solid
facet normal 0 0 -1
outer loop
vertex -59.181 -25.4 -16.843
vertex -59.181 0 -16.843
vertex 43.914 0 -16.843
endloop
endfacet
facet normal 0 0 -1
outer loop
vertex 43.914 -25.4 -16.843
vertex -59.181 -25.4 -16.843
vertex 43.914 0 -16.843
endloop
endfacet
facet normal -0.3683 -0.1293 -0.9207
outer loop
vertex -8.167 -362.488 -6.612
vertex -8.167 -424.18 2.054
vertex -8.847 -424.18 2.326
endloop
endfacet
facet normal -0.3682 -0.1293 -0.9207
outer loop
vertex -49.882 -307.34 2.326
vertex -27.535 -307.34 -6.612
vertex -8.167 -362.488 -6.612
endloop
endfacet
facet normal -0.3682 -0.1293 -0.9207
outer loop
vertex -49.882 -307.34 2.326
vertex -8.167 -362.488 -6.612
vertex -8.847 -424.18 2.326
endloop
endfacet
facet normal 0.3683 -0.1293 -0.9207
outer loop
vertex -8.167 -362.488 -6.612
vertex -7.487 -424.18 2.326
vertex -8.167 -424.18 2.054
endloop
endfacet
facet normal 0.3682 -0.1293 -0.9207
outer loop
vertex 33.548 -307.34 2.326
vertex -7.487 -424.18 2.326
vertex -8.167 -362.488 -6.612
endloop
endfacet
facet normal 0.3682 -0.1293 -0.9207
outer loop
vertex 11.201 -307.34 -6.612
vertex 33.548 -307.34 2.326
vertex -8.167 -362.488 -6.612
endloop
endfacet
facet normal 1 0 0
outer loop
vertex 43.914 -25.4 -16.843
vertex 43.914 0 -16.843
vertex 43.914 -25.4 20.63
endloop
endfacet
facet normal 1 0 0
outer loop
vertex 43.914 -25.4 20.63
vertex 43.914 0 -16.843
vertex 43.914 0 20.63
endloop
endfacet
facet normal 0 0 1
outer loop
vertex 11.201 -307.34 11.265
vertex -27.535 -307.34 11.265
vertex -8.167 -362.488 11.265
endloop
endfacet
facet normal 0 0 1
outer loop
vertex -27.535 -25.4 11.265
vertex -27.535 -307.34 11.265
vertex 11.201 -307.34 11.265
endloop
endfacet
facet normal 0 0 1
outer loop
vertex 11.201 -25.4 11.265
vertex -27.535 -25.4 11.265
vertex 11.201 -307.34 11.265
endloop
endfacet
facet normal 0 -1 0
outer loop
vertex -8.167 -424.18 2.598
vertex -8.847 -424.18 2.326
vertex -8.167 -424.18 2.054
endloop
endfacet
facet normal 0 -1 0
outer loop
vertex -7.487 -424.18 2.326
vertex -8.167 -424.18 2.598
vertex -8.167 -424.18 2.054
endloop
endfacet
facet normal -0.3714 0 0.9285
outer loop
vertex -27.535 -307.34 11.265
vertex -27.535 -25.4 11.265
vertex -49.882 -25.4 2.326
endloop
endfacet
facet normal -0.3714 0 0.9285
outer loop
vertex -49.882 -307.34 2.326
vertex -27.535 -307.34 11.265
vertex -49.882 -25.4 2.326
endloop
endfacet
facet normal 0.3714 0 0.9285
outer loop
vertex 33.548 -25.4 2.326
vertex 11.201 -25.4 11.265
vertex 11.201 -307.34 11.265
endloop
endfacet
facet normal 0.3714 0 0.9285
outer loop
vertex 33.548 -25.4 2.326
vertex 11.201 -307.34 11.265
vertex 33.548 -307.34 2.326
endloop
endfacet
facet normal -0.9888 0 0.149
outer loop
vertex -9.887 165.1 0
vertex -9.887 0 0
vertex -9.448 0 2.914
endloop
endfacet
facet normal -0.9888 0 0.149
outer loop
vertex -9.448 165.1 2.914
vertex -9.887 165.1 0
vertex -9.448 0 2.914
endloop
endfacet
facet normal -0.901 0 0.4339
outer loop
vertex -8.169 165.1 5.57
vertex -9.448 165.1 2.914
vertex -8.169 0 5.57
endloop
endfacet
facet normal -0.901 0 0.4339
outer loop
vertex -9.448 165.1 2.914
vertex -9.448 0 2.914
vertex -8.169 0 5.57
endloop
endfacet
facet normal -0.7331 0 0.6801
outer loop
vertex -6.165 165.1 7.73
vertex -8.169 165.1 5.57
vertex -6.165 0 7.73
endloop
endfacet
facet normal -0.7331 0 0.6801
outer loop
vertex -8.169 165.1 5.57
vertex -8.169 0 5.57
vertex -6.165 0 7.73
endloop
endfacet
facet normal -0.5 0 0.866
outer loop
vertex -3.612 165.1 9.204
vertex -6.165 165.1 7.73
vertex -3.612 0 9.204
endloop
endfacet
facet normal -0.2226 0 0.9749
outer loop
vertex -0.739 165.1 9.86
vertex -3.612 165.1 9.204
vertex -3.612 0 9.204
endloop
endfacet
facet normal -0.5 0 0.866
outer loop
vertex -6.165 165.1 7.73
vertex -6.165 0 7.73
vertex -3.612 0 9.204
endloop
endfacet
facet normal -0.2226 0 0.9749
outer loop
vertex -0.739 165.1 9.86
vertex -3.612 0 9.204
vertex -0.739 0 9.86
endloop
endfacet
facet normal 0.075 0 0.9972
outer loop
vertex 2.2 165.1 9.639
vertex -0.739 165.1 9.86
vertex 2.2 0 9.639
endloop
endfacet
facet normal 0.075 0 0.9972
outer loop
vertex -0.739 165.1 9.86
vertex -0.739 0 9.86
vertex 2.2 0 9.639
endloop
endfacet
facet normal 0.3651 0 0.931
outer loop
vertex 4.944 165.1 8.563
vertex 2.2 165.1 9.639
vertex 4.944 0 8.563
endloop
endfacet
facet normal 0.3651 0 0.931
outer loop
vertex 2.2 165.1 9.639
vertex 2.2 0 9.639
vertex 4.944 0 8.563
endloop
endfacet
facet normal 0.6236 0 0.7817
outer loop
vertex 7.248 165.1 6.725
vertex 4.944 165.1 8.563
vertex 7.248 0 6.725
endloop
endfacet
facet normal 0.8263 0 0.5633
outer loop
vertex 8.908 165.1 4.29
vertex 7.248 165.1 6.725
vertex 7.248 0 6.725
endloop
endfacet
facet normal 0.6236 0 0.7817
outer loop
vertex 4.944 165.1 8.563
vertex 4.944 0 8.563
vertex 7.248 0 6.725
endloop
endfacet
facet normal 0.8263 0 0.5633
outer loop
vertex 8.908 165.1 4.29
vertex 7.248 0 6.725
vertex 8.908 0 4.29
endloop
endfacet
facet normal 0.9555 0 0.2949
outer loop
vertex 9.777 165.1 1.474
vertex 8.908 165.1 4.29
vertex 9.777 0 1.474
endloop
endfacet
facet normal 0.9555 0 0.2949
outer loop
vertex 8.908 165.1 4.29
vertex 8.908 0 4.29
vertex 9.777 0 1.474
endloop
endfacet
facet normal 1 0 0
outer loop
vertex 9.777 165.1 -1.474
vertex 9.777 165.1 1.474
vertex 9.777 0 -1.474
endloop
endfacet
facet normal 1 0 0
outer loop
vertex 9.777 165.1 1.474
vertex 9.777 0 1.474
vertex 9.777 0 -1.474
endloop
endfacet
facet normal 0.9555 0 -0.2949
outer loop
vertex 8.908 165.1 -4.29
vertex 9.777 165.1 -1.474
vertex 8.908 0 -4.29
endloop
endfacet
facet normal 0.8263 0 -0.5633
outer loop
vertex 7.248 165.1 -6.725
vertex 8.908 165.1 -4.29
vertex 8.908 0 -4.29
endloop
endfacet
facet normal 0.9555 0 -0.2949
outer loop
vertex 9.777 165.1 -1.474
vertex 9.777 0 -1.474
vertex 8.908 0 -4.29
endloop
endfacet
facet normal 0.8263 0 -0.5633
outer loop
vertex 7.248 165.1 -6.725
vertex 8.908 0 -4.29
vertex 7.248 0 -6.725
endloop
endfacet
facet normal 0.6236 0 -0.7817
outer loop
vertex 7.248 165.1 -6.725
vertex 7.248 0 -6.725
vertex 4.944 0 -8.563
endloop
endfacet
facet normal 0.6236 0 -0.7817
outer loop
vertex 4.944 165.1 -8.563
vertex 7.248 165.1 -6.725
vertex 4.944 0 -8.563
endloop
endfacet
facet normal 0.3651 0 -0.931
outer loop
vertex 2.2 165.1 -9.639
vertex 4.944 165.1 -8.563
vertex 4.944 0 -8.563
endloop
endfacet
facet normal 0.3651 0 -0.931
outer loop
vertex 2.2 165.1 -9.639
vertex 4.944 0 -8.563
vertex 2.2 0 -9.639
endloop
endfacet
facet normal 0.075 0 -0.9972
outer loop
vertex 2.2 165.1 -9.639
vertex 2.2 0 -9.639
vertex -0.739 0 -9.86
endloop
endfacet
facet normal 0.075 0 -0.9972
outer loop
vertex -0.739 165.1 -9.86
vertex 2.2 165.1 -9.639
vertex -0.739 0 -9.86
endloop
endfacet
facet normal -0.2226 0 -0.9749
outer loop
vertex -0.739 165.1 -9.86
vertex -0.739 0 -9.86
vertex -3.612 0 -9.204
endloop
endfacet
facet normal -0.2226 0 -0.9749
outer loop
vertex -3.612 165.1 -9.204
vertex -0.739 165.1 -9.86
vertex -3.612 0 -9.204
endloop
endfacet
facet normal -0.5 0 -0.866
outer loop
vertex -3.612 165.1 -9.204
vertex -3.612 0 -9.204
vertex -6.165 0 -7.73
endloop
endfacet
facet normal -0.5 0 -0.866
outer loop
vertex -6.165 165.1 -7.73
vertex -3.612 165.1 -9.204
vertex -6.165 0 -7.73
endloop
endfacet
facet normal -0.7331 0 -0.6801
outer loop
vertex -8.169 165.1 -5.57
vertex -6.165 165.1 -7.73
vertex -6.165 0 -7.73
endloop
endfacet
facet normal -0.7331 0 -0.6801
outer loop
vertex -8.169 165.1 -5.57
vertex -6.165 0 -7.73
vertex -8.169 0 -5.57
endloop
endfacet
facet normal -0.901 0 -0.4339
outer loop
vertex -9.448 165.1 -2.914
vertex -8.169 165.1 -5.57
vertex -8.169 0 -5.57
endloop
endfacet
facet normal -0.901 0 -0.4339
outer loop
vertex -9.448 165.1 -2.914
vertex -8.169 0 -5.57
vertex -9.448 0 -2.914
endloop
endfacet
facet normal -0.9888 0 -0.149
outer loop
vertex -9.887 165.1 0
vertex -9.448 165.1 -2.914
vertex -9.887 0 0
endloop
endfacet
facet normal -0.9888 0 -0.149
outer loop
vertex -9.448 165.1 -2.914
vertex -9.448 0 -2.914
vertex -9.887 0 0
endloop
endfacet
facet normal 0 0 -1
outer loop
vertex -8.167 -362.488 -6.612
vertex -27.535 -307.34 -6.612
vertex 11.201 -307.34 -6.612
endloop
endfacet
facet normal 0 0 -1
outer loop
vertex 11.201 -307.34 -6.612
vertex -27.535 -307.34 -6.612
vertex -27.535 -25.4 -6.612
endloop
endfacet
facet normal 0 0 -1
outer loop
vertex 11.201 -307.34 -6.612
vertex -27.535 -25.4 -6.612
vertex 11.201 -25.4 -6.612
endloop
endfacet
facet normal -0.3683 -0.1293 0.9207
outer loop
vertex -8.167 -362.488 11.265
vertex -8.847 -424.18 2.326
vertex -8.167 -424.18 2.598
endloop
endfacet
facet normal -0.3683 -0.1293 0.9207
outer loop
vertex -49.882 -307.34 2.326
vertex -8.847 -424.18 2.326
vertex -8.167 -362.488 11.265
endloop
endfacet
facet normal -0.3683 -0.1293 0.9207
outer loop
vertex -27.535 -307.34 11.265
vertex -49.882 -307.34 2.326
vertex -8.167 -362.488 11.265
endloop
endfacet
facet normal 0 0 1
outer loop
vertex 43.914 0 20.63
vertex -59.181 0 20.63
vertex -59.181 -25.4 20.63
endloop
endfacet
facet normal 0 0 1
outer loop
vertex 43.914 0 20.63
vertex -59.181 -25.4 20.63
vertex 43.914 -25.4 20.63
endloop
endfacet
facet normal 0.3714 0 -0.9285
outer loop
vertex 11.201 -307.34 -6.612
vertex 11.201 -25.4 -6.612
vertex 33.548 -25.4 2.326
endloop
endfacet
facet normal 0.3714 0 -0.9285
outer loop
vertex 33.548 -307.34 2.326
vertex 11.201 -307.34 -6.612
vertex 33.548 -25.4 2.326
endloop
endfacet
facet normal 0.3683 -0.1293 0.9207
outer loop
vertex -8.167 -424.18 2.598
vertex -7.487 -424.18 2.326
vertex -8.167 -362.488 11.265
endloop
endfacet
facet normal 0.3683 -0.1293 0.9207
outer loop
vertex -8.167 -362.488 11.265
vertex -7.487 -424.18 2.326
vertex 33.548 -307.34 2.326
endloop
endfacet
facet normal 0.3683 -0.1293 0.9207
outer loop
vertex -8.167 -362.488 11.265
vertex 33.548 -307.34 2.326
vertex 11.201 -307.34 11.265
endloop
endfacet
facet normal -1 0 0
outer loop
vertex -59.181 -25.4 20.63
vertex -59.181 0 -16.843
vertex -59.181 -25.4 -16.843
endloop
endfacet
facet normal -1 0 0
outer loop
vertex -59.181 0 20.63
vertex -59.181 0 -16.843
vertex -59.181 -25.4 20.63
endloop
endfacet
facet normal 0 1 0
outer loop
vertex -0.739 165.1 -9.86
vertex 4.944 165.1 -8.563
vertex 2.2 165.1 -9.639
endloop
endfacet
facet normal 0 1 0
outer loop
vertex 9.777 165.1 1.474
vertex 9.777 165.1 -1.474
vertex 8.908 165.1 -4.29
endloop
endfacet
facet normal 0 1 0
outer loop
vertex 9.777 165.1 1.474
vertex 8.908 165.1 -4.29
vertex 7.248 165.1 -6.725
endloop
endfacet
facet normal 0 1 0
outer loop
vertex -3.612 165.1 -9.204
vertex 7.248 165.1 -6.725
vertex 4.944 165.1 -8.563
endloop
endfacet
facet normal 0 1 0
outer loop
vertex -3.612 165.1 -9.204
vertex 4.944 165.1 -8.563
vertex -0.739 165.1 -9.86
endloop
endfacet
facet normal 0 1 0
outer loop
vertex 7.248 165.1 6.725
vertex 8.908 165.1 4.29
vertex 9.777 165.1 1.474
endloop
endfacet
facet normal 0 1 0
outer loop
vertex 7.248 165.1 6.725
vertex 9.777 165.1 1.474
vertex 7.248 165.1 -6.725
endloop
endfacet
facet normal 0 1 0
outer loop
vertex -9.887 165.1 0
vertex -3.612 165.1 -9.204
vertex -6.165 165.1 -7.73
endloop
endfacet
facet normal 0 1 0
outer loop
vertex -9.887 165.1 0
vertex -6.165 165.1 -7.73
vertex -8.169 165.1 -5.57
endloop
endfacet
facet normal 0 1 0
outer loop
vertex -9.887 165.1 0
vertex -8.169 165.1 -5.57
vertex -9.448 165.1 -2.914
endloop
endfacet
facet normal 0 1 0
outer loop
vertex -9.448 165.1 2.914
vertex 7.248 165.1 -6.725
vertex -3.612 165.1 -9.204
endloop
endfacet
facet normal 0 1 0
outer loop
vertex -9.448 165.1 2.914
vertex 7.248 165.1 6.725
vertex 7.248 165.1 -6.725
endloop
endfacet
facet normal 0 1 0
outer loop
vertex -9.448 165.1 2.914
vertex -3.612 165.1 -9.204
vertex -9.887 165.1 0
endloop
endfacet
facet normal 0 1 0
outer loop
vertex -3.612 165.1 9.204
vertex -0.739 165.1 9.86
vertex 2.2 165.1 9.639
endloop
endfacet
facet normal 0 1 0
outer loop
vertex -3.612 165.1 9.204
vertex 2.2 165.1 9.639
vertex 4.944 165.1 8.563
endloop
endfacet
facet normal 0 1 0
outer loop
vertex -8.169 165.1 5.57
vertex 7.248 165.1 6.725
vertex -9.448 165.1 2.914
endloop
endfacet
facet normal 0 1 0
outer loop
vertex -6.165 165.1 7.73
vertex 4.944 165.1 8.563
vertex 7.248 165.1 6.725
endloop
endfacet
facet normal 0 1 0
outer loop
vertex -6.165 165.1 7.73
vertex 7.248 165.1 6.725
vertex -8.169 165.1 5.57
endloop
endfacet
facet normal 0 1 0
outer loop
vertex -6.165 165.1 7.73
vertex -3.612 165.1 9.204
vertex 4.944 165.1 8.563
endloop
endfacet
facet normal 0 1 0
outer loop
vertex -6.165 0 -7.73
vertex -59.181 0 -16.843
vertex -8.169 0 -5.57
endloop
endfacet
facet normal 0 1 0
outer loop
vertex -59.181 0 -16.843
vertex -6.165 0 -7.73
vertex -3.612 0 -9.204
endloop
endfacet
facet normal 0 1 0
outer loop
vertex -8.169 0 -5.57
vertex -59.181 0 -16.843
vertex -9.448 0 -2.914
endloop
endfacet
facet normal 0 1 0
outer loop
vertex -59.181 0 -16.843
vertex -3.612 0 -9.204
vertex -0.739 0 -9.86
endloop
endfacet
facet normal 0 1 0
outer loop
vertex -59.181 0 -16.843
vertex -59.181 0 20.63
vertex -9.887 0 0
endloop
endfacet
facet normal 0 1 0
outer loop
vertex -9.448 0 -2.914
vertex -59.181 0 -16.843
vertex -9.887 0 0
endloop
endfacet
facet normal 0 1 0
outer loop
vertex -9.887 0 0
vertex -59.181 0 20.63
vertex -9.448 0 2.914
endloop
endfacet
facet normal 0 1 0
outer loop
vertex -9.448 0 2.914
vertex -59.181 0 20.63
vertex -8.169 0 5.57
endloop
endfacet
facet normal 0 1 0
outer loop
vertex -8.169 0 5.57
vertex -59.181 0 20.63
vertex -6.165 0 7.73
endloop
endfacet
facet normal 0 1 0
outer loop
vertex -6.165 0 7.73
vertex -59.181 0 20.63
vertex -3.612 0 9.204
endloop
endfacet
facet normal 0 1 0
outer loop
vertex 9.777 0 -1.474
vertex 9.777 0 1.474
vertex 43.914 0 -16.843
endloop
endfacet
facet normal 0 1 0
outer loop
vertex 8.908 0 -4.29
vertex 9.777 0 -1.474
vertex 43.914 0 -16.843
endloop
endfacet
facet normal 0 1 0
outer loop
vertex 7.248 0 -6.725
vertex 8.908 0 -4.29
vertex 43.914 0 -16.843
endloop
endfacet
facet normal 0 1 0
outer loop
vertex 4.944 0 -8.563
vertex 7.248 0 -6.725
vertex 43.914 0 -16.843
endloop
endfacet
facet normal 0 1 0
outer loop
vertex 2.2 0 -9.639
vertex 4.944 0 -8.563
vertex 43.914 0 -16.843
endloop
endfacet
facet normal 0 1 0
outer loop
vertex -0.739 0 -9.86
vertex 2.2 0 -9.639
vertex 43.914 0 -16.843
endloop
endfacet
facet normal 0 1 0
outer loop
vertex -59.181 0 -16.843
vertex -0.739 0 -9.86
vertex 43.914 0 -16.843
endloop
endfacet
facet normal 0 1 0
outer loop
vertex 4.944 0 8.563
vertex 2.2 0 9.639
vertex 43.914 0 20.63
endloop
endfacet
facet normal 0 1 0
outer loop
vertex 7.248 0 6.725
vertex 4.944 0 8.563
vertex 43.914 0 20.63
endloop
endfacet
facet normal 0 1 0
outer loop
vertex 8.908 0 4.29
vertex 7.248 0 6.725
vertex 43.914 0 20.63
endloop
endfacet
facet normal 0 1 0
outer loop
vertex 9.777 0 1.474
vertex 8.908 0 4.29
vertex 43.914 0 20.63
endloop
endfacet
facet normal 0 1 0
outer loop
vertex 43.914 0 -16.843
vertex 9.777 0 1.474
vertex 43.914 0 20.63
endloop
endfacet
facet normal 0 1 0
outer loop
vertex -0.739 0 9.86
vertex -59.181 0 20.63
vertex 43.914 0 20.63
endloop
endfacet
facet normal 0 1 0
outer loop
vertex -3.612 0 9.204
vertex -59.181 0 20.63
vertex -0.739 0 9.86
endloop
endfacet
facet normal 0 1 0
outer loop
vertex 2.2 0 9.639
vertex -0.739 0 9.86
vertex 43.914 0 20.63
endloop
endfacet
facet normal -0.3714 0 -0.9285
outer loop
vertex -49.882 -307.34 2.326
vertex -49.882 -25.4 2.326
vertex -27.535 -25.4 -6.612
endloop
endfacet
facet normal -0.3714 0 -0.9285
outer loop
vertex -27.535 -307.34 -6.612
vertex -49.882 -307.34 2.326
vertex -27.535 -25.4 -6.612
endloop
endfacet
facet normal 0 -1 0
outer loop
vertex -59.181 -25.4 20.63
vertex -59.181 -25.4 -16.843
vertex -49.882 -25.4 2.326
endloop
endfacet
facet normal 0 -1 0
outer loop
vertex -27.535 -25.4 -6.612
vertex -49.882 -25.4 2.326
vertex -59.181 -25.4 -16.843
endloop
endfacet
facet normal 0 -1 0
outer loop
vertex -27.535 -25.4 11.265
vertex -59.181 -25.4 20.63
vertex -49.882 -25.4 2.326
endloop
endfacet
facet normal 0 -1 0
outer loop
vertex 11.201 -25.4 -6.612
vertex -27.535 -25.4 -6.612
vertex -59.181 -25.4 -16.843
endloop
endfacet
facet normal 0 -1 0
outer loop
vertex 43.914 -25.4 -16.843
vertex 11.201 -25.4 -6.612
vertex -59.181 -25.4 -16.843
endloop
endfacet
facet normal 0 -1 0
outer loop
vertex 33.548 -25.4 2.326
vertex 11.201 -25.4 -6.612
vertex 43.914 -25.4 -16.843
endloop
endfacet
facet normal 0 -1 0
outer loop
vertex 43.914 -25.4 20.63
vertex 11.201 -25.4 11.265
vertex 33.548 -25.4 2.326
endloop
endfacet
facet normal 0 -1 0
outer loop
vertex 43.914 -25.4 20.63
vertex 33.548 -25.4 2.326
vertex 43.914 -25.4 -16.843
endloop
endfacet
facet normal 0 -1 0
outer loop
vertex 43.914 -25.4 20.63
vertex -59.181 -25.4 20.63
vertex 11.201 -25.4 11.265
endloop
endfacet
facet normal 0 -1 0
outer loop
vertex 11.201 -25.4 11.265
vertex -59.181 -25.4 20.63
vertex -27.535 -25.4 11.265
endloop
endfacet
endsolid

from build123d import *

# Parameters (mm, degrees)
F0_W        = 103.0951477587
F0_H        = 37.4727938324
F1_DEPTH    = 25.4
F2_R        = 9.8872931358
F3_DEPTH    = 165.1
F4_W        = 89.5363204181
F4_H        = 17.8772863001
F5_DEPTH    = 398.78
F6_T1_DEPTH = 464.6450864339
F7_SIZE2    = 116.84
F7_SIZE     = 15.24


# Not quite as in the source:
# - a fillet or chamfer that OpenCascade refuses, or shapes differently, is made with other operations: its cross-section is extruded or revolved along the edge and cut away or added


with BuildPart() as f1:
    # F0 (on Front) → F1 (new body)
    with BuildSketch(Plane.XZ):
        with Locations((-7.6333563775, 1.8935641274)):
            Rectangle(F0_W, F0_H)
    extrude(amount=F1_DEPTH)

    # F2 (on face) → F3 (join)
    with BuildSketch(Plane(origin=(0, 0, 0), x_dir=(-1, 0, 0), z_dir=(0, 1, 0))):
        Circle(F2_R)
    extrude(amount=F3_DEPTH)

    # F4 (on face) → F5 (join)
    with BuildSketch(Plane.XZ.offset(25.4)):
        with Locations((-8.1669483334, 2.3263469338)):
            Rectangle(F4_W, F4_H)
    extrude(amount=F5_DEPTH)

    # F6: chamfer of 25.4 x 10.16 on 4 edges, made by hand

    # F6_s2 → F6_t1 (cut)
    with BuildSketch(Plane.XZ.offset(25.4)):
        Polygon((-52.9351085424, 3.5477037838), (-27.5351085424, -6.6122962162), (-52.9351085424, -6.6122962162), align=None)
        Polygon((-27.5351085424, 11.2649900839), (-52.9351085424, 1.1049900839), (-52.9351085424, 11.2649900839), align=None)
        Polygon((11.2012118757, -6.6122962162), (36.6012118757, 3.5477037838), (36.6012118757, -6.6122962162), align=None)
        Polygon((11.2012118757, 11.2649900839), (36.6012118757, 1.1049900839), (36.6012118757, 11.2649900839), align=None)
    extrude(amount=F6_T1_DEPTH, mode=Mode.SUBTRACT)

    # F7 (call 1 of 2: OpenCascade refuses the feature's edges together)
    f7_edges = [f1.edges().sort_by_distance(p)[0] for p in [
        (-38.708412, -424.18, -2.142975),
        (-38.708412, -424.18, 6.795669),
    ]]
    f7_side = f1.faces().sort_by_distance((-8.166948, -424.18, 2.326347))[0]
    chamfer(f7_edges, length=F7_SIZE, length2=F7_SIZE2, reference=f7_side)

    # F7#2 (call 2 of 2)
    f7_2_edges = [f1.edges().sort_by_distance(p)[0] for p in [
        (22.374516, -424.18, -2.142975),
        (22.374516, -424.18, 6.795669),
    ]]
    f7_2_side = f1.faces().sort_by_distance((-8.166948, -424.18, 2.326347))[0]
    chamfer(f7_2_edges, length=F7_SIZE, length2=F7_SIZE2, reference=f7_2_side)


solid = f1.part
